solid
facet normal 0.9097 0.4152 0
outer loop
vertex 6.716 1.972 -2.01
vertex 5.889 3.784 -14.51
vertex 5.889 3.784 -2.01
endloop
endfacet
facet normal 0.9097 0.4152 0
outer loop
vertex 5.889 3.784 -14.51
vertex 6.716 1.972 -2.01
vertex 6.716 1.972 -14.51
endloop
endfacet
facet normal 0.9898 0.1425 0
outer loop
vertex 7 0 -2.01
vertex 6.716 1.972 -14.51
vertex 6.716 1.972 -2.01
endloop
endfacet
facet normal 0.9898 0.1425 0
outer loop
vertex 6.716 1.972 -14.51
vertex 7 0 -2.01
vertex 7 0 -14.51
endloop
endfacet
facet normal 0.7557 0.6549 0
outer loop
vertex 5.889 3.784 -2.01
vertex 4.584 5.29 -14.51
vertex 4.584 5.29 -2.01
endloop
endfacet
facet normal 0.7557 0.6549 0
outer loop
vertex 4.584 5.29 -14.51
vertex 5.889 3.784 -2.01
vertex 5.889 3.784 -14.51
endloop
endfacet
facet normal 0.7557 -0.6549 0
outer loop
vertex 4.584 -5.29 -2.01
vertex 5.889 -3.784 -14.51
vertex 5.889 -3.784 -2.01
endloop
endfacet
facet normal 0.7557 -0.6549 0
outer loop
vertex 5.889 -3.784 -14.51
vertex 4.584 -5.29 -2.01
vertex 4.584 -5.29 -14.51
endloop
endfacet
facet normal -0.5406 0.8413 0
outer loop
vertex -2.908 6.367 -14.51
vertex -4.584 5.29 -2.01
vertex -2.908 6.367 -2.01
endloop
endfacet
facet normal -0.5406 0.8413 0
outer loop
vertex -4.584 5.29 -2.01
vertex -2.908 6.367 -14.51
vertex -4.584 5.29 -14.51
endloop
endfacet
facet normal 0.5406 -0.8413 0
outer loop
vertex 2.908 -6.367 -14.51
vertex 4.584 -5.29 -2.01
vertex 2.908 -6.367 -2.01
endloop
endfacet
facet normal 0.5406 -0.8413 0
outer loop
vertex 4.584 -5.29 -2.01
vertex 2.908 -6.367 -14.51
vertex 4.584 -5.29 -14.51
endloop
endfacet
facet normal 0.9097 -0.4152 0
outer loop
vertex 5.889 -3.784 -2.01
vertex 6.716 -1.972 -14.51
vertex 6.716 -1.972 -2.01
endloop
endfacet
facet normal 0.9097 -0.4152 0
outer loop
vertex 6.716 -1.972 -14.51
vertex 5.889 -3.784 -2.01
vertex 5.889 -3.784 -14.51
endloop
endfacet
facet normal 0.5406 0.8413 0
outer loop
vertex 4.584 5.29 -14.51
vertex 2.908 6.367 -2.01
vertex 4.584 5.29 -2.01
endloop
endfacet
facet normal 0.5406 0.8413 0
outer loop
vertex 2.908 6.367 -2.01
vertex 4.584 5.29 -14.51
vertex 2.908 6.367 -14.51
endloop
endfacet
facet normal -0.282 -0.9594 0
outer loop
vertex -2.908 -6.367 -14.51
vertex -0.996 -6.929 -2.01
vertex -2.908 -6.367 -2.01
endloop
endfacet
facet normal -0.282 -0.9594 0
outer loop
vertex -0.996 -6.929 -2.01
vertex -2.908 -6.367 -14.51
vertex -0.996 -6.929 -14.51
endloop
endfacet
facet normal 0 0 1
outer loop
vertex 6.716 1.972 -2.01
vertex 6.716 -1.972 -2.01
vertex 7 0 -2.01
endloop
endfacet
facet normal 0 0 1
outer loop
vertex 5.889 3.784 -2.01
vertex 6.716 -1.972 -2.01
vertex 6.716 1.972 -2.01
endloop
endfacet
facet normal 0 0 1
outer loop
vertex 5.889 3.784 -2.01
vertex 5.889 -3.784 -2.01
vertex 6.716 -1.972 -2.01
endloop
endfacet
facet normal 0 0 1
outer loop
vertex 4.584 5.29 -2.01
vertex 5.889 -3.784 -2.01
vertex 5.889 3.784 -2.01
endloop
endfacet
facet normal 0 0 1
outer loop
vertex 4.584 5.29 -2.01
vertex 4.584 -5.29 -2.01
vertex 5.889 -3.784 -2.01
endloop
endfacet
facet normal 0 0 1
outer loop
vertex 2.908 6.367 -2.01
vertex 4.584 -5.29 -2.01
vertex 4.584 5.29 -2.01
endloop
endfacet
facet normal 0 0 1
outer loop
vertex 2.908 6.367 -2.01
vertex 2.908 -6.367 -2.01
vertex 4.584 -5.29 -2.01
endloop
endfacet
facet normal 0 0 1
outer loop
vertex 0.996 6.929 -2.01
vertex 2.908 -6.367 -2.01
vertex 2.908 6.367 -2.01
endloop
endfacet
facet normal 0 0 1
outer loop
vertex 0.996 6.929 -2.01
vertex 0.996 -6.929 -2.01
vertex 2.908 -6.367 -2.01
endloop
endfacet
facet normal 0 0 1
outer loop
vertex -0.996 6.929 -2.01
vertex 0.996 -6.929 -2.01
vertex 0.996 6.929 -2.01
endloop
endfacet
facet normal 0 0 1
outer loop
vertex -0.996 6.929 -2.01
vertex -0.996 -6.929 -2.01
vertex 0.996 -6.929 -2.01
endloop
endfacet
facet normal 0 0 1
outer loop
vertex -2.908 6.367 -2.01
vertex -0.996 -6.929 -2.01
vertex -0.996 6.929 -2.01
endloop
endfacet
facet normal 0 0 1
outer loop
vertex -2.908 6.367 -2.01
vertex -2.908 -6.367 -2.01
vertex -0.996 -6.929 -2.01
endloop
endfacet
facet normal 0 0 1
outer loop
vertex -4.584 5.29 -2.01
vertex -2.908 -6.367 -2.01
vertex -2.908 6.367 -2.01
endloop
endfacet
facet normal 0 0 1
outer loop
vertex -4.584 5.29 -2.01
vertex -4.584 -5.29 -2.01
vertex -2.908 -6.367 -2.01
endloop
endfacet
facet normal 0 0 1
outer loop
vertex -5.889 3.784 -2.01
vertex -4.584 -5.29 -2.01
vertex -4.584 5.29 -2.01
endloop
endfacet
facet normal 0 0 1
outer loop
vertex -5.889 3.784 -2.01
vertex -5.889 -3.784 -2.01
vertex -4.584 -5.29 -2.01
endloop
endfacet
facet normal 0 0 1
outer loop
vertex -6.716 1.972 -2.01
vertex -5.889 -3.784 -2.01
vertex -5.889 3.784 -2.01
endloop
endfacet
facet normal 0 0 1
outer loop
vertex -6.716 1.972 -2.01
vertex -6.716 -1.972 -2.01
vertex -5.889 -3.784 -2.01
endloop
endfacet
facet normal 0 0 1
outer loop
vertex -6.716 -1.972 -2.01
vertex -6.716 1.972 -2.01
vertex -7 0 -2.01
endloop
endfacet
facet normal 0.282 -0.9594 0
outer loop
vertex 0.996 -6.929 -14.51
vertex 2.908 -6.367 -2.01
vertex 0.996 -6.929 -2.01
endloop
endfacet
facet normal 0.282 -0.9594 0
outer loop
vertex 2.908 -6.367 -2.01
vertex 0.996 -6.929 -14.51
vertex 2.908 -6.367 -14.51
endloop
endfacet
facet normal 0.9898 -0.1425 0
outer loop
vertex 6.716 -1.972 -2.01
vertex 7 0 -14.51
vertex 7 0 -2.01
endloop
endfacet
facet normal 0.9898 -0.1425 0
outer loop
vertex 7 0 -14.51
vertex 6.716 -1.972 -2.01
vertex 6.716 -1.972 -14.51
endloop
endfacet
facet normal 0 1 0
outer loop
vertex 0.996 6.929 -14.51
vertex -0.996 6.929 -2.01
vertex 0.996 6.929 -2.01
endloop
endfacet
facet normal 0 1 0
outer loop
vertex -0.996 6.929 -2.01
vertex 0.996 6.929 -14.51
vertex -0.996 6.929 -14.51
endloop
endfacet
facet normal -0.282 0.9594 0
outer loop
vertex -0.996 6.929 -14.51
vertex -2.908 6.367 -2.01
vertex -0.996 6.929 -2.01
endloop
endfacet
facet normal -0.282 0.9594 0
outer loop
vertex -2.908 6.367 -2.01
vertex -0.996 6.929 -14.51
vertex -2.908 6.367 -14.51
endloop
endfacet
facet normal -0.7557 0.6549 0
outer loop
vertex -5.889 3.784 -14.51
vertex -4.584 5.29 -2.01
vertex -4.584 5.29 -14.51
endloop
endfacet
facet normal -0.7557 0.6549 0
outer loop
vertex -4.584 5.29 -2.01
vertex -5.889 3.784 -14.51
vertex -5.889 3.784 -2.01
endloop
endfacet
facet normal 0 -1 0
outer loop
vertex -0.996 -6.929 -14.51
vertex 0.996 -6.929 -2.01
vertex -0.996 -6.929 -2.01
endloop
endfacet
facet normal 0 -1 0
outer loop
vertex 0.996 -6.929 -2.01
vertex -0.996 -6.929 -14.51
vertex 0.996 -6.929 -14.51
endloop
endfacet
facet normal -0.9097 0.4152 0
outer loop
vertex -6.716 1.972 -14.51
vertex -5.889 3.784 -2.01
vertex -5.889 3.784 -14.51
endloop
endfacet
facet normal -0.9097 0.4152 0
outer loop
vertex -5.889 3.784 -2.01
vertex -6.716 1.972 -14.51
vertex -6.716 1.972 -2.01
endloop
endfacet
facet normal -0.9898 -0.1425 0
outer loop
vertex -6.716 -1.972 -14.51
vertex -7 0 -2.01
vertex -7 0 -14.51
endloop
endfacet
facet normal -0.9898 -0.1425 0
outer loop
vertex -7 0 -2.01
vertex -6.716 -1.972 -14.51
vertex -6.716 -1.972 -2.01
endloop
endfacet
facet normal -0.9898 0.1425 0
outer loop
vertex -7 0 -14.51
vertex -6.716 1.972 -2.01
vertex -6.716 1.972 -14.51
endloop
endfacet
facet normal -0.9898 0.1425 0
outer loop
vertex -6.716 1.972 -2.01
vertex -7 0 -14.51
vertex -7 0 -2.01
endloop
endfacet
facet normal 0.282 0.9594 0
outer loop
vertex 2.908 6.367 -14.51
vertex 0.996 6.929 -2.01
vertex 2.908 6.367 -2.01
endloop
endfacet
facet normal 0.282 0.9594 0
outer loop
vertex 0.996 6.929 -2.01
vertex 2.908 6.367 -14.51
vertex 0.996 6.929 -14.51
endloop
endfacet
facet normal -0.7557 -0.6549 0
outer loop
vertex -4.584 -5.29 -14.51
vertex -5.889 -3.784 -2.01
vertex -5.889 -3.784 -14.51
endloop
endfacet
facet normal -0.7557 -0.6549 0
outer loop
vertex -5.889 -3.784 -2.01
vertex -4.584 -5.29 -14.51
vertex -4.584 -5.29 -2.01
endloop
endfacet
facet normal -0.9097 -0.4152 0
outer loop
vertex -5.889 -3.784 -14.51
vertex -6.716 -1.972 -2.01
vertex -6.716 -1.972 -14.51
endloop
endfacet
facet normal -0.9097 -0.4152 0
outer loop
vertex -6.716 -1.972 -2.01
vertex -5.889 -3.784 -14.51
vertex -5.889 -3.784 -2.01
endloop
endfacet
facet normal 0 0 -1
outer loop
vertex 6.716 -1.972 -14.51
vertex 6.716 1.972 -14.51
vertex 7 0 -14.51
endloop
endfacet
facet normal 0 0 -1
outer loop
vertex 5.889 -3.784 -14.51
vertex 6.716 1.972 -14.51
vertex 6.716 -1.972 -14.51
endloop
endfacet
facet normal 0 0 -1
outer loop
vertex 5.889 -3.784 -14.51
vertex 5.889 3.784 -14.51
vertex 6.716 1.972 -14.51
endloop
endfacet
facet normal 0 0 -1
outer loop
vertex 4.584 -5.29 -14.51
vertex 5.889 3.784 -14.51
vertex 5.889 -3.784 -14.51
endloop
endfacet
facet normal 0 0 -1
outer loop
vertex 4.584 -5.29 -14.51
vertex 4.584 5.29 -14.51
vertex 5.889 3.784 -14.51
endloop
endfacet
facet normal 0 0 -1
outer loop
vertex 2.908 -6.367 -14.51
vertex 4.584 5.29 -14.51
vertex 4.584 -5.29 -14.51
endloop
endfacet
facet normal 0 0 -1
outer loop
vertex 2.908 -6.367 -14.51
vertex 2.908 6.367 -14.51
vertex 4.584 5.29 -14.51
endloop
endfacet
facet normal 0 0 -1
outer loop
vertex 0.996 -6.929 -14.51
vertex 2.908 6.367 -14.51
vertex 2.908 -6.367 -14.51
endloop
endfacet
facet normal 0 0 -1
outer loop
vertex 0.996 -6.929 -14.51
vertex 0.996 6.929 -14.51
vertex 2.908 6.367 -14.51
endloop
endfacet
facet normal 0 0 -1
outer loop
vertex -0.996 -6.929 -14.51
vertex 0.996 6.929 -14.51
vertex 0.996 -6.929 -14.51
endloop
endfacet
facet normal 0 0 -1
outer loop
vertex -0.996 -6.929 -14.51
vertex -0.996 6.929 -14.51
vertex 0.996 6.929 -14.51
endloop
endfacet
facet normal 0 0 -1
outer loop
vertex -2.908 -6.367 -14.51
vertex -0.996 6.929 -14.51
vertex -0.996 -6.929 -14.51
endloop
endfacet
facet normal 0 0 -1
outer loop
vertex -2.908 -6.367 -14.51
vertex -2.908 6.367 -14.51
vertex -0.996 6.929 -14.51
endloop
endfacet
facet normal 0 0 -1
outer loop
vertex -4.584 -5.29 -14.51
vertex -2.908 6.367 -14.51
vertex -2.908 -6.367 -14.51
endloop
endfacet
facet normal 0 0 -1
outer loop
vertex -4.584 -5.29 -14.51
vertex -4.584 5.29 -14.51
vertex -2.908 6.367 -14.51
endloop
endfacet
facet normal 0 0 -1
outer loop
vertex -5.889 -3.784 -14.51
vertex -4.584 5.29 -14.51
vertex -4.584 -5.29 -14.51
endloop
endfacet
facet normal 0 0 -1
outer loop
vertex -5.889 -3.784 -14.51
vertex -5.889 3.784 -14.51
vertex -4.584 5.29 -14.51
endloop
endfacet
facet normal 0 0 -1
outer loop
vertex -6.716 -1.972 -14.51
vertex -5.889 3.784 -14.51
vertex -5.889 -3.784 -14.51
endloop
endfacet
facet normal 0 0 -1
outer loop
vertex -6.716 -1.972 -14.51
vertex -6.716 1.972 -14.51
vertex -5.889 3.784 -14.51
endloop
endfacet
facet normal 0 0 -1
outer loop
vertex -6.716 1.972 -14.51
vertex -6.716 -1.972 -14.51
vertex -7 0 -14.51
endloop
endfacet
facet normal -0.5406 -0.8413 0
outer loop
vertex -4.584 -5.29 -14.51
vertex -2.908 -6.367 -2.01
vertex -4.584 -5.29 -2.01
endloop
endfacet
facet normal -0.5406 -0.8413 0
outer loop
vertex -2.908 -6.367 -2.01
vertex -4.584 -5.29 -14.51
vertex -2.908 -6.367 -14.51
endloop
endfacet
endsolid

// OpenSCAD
//$fn = 50;

HubX = 11;
HubY = 5.2;
HubZ = 4;
ShaftRadius = 0.75;
TMountRadius = 1;

1104_Motor(HubX, HubY, HubZ, ShaftRadius, TMountRadius);

// 3020Propeller(HubX, HubY, HubZ, ShaftRadius, TMountRadius);

// translate([HubX / 4, 0, 0]) {
// 	M2x6mmScrew();// Right t-mount screw
// }
// translate([-HubX / 4, 0, 0]) {
// 	M2x6mmScrew();// Left t-mount screw
// }



module 1104_Motor(hubX, hubY, hubZ, shaftR, tmountR) {
	color("DimGray") {
		_motorR = 7;
		_motorHeight = 12.5;
		difference() {
			translate([0, 0, -8.26]) {	// TODO: What's the basis for this magic number?
				cylinder(r = _motorR, h = _motorHeight, center = true);
			}

			// Drive shaft
			cylinder(r = shaftR, h = hubZ, center = true);
		}
		
	}
}

module M2x6mmScrew() {
	color("DarkSlateGray") {
		translate([0, 0, 2.75]) {
			render() difference() {
				cylinder(r = 2, h = 1.5, center = true);
				cylinder(r = .85, h = 1.5, center = true);
			}
		}
		translate([0, 0, -1]) {
			cylinder(r = 1, h = 6, center = true);
		}
	}
}

module 3020Propeller(hubX, hubY, hubZ, shaftR, tmountR) {
	color("DarkOrange") {
		_bladeX = 33;
		_bladeY = 9;
		
		translate([_bladeX  - hubX, 0, 0]) {
			scale([1, _bladeY / _bladeX, 1]) {
				cylinder(d = _bladeX, h = 1, center = true);
			}
		}
		translate([-_bladeX  + hubX, 0, 0]) {
			scale([1, _bladeY / _bladeX, 1]) {
				cylinder(d = _bladeX, h = 1, center = true);
			}
		}
		render() difference() {
			// The hub
			scale([1, hubY / hubX, 1]) {
				cylinder(d = hubX, h = hubZ, center = true);
			}

			// Subtract the drive shaft & screw holes
			// Drive shaft
			cylinder(r = shaftR, h = hubZ, center = true);
			// Right T-Mount
			translate([hubX / 4, 0, 0]) {
				cylinder(r = tmountR, h = hubZ, center = true);
			}
			// Left T-Mount
			translate([-hubX / 4, 0, 0]) {
				cylinder(r = tmountR, h = hubZ, center = true);
			}
		}
	}
}
